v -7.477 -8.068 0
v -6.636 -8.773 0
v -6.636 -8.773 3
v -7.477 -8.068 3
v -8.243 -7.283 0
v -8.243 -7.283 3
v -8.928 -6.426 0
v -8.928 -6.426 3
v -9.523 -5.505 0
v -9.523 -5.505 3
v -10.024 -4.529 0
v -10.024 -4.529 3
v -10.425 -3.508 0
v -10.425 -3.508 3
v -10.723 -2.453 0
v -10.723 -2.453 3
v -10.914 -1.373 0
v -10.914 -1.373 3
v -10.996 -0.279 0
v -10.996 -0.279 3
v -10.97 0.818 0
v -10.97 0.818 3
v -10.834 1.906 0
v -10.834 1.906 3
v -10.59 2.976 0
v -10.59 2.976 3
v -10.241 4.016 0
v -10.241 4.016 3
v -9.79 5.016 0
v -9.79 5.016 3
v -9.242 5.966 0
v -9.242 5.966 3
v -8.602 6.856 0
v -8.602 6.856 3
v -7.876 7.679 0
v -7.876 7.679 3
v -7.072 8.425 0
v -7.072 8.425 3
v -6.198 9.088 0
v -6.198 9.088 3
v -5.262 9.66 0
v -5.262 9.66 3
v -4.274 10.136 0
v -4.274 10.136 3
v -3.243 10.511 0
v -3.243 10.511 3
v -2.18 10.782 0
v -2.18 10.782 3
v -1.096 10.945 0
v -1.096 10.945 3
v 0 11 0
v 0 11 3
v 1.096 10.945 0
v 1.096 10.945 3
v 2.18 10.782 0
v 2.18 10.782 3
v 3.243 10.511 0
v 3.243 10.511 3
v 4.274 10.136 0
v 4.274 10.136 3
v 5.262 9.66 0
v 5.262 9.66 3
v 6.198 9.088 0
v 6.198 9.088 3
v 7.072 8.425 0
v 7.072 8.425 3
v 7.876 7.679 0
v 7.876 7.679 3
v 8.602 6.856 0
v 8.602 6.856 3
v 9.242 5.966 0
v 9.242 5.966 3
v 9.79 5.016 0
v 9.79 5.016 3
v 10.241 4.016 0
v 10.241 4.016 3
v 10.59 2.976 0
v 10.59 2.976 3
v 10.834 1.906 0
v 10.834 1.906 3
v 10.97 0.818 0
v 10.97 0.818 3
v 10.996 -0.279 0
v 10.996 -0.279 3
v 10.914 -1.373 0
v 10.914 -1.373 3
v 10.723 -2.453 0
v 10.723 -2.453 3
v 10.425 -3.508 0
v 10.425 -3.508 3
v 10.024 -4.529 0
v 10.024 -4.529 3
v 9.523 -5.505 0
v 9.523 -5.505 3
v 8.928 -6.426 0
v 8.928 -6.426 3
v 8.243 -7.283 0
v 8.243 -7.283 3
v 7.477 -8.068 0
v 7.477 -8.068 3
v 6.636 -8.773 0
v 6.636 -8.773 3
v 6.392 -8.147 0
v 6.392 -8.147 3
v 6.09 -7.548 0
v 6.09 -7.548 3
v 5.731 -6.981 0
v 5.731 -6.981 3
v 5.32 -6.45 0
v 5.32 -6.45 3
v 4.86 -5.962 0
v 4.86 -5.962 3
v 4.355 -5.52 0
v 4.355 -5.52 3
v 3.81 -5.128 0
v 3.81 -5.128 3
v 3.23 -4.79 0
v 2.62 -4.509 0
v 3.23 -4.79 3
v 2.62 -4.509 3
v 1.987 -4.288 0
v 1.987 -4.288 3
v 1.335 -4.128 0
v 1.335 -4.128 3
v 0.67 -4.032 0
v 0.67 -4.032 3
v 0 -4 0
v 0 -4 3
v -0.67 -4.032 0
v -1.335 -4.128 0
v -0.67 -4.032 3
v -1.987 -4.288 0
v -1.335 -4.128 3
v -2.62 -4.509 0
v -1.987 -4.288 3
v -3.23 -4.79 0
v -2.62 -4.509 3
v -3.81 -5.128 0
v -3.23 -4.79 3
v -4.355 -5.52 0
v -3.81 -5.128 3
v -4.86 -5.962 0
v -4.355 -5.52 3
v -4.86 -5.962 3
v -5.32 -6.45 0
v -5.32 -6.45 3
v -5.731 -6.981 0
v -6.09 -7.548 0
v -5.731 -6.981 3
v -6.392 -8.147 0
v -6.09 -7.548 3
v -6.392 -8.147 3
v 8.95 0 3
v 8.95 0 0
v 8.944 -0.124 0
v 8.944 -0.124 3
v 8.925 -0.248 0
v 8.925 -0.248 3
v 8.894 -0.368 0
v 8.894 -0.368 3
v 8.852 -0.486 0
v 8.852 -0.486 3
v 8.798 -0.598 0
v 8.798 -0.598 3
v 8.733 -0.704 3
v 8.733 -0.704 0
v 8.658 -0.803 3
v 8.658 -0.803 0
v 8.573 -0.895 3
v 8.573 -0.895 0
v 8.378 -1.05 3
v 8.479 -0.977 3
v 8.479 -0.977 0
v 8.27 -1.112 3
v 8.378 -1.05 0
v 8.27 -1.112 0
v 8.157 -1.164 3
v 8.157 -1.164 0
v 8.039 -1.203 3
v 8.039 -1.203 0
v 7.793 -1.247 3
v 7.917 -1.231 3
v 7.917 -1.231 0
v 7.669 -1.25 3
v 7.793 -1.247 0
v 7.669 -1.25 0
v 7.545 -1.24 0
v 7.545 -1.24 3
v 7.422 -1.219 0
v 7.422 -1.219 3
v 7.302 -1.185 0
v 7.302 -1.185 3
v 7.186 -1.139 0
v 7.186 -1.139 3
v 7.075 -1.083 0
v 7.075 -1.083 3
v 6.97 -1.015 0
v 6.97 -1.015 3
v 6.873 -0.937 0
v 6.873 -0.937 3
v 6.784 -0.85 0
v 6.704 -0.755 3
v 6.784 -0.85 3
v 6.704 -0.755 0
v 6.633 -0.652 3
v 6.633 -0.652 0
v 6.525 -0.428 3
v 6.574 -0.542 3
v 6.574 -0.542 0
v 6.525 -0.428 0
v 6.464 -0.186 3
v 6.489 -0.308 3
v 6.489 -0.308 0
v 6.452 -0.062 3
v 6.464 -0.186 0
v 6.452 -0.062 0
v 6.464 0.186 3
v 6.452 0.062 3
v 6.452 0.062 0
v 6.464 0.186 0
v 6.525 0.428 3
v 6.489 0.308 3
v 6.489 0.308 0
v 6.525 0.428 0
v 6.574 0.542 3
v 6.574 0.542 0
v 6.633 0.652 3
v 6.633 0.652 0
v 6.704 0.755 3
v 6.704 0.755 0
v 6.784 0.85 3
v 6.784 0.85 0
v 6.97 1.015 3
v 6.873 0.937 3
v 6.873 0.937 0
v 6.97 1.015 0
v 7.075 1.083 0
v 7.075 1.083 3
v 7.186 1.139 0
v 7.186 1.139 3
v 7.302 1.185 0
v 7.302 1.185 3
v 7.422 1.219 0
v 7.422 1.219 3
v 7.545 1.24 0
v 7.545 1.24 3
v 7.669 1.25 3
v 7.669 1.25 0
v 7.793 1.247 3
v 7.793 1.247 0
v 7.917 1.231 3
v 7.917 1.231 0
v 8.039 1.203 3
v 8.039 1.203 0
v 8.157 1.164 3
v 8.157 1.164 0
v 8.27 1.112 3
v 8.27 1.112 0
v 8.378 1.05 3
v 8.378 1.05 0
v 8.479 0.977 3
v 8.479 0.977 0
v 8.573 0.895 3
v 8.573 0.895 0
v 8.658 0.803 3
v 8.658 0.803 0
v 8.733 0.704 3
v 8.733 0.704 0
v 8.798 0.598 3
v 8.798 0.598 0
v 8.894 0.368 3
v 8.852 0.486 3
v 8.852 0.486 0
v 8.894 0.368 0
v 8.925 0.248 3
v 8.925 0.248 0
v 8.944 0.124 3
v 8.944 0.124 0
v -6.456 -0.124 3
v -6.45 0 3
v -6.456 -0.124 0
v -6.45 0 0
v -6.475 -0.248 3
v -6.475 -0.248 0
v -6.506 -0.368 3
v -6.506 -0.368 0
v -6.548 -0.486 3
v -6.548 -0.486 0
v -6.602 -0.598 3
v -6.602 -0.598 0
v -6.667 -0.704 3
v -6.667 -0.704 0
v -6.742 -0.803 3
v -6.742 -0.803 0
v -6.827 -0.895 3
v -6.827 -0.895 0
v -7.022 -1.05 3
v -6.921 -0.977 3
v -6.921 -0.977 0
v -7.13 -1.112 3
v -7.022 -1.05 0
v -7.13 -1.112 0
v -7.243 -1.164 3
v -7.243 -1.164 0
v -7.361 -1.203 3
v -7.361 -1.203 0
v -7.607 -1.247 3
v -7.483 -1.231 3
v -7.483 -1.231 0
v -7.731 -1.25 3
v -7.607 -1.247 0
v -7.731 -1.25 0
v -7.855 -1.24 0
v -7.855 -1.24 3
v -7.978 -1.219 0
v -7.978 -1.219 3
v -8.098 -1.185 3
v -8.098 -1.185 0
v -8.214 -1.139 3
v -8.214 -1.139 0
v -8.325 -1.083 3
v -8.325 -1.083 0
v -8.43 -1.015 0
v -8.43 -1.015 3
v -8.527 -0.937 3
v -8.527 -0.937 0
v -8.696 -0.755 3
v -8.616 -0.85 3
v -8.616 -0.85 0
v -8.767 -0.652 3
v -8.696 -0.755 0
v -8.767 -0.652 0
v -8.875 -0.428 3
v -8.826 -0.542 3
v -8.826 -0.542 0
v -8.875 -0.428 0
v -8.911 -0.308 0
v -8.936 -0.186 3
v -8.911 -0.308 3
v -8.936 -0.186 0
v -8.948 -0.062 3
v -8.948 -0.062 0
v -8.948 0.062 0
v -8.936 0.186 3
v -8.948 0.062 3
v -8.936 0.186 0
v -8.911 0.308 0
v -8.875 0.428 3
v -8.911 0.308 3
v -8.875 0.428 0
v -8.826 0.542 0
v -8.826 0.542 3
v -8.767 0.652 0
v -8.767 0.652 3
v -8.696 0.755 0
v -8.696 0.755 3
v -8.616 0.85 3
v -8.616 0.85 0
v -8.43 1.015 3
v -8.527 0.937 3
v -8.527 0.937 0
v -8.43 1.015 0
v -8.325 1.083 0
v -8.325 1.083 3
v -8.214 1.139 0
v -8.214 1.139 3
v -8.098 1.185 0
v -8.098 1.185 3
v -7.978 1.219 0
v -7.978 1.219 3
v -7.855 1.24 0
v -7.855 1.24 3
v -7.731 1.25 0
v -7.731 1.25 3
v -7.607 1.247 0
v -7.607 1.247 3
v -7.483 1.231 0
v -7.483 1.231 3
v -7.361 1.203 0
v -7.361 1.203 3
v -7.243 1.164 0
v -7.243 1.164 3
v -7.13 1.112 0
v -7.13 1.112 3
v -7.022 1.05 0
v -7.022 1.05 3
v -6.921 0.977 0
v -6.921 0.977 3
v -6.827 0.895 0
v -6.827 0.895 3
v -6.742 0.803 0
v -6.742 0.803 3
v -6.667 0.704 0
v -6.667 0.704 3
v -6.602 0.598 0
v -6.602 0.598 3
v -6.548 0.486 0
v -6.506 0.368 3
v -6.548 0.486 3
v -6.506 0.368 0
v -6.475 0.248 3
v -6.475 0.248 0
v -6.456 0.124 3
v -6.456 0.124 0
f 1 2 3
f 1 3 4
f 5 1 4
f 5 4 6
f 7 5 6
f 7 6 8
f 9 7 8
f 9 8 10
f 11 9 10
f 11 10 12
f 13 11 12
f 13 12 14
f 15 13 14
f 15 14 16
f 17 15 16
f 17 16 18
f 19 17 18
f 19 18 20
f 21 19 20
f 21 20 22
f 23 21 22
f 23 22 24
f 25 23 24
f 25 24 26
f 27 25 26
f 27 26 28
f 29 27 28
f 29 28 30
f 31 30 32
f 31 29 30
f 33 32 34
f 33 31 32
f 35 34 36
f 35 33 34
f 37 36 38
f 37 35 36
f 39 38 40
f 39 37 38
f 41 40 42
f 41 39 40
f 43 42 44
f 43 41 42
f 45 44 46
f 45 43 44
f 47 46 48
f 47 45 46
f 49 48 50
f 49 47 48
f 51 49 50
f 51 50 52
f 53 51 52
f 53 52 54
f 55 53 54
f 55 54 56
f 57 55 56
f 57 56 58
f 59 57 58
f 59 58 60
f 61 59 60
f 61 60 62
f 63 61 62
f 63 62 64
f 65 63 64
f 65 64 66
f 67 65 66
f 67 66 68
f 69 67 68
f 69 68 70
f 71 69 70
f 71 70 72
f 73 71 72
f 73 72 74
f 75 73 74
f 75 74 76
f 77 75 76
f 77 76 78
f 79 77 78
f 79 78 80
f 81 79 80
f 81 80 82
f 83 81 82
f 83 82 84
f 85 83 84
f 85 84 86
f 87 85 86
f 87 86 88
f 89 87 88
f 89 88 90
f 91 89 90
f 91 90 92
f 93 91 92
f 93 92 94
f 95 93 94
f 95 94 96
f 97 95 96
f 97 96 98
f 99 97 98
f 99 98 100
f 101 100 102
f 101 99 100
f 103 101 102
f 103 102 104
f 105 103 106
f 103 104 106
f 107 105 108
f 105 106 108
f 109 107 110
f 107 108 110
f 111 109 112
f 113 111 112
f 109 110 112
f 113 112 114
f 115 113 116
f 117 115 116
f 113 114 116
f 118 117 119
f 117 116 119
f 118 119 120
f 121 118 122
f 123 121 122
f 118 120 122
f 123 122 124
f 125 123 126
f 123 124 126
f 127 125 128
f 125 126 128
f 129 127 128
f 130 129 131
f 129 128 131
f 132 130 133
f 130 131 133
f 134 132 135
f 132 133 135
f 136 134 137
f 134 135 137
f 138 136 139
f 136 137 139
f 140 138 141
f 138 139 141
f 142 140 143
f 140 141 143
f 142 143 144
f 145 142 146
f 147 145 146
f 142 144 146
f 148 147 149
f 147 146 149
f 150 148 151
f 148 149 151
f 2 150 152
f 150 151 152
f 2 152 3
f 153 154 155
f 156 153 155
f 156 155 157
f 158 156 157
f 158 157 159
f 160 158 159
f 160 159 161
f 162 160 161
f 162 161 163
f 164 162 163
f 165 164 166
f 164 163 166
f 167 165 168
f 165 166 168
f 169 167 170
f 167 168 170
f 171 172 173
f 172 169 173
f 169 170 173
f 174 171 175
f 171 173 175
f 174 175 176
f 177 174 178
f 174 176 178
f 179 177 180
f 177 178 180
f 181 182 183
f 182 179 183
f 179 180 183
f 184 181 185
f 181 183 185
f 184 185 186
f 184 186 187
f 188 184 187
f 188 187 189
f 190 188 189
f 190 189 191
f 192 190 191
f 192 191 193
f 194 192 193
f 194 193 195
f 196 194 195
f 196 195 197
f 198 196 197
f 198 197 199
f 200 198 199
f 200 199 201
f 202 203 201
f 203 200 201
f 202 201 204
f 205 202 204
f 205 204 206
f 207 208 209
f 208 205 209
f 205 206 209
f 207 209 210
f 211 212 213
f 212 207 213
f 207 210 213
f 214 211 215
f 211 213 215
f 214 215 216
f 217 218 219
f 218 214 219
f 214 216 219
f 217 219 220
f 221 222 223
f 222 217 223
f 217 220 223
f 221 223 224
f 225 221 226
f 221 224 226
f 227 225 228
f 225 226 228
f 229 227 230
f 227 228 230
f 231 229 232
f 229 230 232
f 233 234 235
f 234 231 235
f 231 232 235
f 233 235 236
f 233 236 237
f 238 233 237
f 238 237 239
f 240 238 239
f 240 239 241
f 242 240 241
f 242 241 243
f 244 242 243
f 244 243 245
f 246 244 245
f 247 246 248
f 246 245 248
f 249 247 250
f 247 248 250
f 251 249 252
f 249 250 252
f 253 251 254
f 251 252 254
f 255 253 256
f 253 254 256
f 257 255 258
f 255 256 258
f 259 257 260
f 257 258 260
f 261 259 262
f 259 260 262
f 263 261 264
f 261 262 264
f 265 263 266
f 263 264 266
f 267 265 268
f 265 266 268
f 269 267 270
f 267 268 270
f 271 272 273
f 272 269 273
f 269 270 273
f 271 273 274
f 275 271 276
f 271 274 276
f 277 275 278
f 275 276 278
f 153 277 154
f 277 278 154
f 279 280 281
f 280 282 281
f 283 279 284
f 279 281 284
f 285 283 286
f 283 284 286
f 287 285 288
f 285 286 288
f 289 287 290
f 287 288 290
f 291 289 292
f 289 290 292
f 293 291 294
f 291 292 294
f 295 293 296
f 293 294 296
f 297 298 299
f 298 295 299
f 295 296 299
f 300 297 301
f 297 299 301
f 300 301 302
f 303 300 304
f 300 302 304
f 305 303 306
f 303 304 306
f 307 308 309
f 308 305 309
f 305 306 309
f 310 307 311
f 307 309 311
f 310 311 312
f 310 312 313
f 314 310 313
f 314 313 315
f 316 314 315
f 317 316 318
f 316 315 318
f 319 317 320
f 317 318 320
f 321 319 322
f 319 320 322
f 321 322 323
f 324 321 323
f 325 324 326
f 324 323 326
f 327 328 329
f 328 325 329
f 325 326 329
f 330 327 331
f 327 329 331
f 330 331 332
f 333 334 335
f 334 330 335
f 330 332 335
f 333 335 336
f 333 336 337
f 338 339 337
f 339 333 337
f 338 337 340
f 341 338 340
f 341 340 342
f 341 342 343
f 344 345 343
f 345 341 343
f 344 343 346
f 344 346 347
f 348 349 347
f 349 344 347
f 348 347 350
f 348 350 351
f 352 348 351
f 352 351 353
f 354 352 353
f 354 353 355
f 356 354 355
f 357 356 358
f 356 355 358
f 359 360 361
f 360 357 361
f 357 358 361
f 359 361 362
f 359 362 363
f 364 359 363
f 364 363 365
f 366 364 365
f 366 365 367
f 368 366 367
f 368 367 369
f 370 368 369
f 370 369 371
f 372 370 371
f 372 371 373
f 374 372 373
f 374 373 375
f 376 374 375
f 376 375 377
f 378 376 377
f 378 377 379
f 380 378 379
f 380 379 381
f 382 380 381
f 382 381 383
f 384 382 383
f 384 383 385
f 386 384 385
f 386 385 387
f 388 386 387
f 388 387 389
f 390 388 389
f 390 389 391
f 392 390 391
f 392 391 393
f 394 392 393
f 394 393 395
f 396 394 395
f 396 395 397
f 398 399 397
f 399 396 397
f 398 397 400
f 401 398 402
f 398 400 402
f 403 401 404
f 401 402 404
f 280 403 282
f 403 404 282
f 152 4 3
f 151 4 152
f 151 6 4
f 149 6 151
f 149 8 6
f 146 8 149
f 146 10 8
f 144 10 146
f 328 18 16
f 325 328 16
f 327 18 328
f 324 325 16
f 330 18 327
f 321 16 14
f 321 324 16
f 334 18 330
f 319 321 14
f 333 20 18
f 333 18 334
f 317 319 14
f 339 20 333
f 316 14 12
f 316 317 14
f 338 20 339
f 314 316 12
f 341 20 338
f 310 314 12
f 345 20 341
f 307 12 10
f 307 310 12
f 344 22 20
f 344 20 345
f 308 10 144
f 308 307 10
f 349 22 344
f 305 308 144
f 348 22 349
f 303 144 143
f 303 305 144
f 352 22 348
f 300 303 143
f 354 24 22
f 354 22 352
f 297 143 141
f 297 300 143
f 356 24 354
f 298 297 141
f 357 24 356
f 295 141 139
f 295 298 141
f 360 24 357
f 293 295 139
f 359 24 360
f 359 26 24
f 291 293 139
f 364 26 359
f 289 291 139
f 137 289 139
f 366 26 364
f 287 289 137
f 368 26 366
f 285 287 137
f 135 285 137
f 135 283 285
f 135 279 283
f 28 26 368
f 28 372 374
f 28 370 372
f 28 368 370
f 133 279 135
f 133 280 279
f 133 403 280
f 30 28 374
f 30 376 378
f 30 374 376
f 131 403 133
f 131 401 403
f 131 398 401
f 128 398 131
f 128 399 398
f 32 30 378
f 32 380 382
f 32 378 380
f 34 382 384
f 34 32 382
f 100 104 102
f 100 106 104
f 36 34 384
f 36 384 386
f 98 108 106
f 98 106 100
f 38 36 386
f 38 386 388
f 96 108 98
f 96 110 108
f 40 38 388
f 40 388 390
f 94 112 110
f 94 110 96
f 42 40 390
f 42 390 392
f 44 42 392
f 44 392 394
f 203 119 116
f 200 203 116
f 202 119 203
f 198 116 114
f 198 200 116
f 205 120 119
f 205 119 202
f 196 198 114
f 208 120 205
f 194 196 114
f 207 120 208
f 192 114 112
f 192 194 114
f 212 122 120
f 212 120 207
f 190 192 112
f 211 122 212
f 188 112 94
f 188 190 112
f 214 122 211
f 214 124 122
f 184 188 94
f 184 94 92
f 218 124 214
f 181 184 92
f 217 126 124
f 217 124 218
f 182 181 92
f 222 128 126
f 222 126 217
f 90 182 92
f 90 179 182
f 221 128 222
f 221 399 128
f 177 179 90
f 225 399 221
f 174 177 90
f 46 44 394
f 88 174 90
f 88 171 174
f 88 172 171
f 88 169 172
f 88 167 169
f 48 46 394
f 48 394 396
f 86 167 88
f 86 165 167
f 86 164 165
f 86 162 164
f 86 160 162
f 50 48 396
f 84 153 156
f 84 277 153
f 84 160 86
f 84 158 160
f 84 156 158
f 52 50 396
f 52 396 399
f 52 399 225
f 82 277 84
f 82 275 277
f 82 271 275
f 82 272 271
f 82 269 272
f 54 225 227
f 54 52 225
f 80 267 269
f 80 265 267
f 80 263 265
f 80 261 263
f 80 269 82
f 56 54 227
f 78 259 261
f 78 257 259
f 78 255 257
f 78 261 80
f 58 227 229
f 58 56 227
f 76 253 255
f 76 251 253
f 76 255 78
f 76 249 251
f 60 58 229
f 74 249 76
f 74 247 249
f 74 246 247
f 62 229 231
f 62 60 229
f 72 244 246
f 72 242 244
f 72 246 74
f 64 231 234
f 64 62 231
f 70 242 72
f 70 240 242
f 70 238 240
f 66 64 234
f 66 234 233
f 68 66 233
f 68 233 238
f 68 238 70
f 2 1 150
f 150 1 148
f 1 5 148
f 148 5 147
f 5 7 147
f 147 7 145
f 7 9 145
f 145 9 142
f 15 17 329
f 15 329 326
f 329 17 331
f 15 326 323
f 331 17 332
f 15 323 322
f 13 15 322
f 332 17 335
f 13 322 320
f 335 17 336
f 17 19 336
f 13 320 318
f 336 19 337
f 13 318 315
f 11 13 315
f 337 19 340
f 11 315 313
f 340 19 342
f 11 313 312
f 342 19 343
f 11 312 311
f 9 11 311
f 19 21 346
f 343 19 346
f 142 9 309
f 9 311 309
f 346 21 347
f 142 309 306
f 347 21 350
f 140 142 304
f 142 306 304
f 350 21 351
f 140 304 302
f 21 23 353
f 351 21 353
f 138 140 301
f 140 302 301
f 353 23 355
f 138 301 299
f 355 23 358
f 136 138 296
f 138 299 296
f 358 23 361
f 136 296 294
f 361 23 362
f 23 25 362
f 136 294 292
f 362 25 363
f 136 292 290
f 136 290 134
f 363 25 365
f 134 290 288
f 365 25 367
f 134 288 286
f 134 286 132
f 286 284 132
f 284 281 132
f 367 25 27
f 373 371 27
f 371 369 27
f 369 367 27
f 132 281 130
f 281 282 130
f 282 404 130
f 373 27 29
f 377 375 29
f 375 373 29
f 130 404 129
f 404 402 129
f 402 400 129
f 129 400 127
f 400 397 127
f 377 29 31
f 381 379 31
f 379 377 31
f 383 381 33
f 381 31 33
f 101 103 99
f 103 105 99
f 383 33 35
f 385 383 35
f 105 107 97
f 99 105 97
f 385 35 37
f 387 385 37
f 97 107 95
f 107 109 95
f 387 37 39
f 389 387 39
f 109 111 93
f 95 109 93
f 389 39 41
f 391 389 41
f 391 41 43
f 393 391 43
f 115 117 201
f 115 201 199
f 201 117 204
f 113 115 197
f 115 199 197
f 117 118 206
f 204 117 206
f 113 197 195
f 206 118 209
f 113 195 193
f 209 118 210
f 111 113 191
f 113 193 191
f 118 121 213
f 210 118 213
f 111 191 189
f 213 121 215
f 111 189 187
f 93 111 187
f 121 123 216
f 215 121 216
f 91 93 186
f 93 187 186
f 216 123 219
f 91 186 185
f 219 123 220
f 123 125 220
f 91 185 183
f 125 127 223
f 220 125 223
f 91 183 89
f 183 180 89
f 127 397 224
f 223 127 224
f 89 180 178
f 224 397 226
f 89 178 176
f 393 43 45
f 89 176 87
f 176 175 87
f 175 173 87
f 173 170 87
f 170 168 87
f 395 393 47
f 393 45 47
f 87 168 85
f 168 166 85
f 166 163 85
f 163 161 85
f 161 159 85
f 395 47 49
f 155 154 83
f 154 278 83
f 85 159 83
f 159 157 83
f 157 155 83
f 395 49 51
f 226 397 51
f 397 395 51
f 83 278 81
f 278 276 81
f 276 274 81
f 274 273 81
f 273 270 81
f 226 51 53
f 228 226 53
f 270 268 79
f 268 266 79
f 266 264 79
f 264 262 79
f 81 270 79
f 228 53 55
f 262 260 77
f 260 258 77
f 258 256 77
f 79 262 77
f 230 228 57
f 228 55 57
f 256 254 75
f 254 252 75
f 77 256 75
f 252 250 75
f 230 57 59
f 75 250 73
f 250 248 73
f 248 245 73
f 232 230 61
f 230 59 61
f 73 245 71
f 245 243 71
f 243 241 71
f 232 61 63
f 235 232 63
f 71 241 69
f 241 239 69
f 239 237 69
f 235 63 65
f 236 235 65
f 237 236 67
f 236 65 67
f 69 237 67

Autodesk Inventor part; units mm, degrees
ref_plane "YZ Plane" through (0, 0, 0) normal (1, 0, 0) x (0, 1, 0)
ref_plane "XZ Plane" through (0, 0, 0) normal (0, 1, 0) x (-1, 0, 0)
ref_plane "XY Plane" through (0, 0, 0) normal (0, 0, 1) x (1, 0, 0)
sketch "Sketch1" plane through (0, 0, 0) normal (0, 0, 1) x (1, 0, 0)
  circle A0 centre (0, 0) radius 11
  line L0 (-7.7, 0) -> (7.7, 0) construction
  circle A1 centre (-7.7, 0) radius 1.25
  circle A2 centre (7.7, 0) radius 1.25
  dimension "d0" = 22
  dimension "d1" = 15.4
  dimension "d2" = 2.5
  dimension "d3" = 2.5
extrude "Extrusion1" add sketch "Sketch1" along normal blind 3
sketch "Sketch2" plane through (0, 0, 3) normal (0, 0, 1) x (1, 0, 0)
  circle A0 centre (0, 0) radius 11 projected
  arc A1 (6.6742, -8.8894) -> (0, -4) centre (0, -11) ccw
  arc A2 (0, -4) -> (-6.6426, -8.7919) centre (0, -11) ccw
  point P0 (-6.6362, -8.7727)
  point P1 (6.6362, -8.7727)
extrude "Extrusion2" cut sketch "Sketch2" against normal blind 10 contours A2 A1 A0 picked at (-1.3613, -8.6538)
equation "\"d0\" = cs_diam"
equation "\"d1\" = cs_holeSpacing"
equation "\"d2\" = cs_holeDiam"
equation "\"d3\" = cs_holeDiam"
equation "\"d4\" = cs_depth"
equation "\"cs_diam\" = 22"
equation "\"cs_holeSpacing\" = 15.4"
equation "\"cs_holeDiam\" = 2.5"
equation "\"cs_depth\" = 3"
properties part number "Caster Spacer 3mm" material "PMMA Plastic"
